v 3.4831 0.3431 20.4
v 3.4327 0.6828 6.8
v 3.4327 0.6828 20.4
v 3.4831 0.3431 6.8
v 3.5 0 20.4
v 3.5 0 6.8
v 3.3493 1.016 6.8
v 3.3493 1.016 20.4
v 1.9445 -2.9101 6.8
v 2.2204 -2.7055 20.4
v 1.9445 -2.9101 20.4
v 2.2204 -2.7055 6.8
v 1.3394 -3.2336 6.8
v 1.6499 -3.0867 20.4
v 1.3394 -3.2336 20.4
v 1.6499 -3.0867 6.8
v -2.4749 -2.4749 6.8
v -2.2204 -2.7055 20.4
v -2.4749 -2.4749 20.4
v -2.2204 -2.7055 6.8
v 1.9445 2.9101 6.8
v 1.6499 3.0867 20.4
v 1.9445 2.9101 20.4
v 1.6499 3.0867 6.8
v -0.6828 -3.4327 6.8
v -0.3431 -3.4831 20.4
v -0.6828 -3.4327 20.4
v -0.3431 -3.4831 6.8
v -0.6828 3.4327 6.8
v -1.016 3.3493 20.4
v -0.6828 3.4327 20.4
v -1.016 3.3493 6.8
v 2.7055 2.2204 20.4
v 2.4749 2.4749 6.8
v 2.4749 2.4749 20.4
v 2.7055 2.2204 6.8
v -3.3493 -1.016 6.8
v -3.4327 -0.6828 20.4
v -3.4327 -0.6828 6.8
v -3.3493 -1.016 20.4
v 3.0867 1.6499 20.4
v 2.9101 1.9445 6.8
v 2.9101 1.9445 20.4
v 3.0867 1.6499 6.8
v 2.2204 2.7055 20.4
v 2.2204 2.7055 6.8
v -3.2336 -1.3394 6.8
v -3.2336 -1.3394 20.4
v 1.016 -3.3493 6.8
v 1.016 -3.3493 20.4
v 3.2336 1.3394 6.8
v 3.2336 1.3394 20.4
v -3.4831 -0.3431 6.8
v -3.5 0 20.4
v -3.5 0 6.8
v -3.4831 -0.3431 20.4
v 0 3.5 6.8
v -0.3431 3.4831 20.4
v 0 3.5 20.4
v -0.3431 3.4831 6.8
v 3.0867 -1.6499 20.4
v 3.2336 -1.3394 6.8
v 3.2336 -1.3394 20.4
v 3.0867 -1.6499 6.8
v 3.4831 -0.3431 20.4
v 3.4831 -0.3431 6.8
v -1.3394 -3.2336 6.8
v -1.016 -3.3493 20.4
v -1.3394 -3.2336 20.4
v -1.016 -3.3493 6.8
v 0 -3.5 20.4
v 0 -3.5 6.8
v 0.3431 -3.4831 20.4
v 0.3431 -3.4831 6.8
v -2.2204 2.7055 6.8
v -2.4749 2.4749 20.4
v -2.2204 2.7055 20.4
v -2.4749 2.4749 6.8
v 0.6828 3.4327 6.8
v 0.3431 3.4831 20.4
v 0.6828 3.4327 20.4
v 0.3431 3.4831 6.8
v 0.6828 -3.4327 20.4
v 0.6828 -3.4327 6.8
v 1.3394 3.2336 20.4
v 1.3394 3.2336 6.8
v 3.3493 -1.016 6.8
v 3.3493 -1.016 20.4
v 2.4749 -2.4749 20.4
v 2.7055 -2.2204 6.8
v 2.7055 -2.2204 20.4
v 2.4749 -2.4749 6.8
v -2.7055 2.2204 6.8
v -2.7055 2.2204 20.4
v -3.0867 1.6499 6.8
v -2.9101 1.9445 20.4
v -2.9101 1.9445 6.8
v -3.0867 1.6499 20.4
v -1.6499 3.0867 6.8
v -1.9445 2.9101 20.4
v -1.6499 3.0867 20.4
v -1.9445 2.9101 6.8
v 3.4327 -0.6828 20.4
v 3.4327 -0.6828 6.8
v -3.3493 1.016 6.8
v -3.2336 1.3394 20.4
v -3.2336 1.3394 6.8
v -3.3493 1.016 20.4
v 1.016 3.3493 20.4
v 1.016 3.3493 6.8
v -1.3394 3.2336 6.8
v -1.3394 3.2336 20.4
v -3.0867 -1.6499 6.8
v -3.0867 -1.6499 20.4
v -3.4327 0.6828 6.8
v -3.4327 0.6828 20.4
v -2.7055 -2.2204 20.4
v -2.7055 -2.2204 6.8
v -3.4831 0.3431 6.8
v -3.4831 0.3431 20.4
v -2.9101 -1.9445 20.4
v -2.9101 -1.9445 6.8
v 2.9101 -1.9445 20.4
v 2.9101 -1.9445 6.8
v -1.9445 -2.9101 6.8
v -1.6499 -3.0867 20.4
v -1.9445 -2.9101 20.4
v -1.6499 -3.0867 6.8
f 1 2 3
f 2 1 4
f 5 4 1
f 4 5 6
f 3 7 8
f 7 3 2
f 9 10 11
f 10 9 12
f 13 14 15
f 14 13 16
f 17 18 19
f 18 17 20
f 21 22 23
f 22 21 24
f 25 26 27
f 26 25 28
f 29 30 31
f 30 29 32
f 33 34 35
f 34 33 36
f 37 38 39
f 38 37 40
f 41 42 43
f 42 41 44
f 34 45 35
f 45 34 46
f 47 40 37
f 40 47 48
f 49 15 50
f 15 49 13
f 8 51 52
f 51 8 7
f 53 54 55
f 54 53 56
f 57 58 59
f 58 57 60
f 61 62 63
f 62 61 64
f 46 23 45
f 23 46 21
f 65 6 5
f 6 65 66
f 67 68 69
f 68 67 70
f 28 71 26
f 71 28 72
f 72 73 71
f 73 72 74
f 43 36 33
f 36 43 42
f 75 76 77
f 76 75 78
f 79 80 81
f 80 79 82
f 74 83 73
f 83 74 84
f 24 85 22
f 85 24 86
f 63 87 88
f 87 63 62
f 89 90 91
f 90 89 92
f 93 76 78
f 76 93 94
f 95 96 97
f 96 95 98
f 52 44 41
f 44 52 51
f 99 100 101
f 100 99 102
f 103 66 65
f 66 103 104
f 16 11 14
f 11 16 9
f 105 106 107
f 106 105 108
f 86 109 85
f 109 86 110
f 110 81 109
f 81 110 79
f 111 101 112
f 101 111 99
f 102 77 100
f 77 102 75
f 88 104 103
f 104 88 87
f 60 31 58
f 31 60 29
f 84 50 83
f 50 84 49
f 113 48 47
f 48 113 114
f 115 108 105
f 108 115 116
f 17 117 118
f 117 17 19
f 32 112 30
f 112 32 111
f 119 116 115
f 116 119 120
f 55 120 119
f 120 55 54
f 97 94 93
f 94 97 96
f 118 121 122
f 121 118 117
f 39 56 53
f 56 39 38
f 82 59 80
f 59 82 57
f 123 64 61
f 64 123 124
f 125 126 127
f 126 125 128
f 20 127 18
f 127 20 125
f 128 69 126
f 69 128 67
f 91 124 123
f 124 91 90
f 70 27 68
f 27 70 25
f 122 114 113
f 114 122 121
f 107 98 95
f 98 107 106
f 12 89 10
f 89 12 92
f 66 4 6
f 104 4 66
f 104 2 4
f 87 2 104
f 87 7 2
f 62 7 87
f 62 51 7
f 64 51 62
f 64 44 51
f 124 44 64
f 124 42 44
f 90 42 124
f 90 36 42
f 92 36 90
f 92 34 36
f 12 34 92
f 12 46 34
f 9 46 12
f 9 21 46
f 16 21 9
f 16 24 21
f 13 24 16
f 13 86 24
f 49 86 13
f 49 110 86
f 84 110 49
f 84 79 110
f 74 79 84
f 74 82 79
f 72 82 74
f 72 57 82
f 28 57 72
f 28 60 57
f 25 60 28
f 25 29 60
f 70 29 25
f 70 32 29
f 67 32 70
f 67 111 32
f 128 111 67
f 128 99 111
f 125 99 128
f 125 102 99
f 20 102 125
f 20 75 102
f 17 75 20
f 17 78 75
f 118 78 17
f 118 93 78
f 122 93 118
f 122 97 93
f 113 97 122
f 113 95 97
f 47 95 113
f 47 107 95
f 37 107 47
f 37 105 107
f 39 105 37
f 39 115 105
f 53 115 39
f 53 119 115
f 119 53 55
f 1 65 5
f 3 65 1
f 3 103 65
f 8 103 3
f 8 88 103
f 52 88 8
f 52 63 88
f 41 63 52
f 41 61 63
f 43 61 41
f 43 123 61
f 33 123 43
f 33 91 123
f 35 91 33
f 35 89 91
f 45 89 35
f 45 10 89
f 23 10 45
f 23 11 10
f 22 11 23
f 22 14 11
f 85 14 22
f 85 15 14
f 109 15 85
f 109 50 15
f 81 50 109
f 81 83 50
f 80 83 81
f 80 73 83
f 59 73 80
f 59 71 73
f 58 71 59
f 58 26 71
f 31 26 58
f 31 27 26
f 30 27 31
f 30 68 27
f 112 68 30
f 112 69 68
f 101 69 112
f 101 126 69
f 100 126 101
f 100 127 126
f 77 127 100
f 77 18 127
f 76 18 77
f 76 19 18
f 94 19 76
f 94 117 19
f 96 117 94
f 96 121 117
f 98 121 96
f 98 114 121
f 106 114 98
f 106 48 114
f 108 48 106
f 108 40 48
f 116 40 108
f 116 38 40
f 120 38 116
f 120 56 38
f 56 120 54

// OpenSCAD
module toggle_switch() {
    union() {
        // Body of the switch
        translate([0, 0, 6.8])
            cylinder(h=13.6, d=7.0, $fn=64);
        
        // Toggle part of the switch
        translate([0, 0, 13.6])
            cylinder(h=5, d=3.0, $fn=64);
    }
}

toggle_switch();
